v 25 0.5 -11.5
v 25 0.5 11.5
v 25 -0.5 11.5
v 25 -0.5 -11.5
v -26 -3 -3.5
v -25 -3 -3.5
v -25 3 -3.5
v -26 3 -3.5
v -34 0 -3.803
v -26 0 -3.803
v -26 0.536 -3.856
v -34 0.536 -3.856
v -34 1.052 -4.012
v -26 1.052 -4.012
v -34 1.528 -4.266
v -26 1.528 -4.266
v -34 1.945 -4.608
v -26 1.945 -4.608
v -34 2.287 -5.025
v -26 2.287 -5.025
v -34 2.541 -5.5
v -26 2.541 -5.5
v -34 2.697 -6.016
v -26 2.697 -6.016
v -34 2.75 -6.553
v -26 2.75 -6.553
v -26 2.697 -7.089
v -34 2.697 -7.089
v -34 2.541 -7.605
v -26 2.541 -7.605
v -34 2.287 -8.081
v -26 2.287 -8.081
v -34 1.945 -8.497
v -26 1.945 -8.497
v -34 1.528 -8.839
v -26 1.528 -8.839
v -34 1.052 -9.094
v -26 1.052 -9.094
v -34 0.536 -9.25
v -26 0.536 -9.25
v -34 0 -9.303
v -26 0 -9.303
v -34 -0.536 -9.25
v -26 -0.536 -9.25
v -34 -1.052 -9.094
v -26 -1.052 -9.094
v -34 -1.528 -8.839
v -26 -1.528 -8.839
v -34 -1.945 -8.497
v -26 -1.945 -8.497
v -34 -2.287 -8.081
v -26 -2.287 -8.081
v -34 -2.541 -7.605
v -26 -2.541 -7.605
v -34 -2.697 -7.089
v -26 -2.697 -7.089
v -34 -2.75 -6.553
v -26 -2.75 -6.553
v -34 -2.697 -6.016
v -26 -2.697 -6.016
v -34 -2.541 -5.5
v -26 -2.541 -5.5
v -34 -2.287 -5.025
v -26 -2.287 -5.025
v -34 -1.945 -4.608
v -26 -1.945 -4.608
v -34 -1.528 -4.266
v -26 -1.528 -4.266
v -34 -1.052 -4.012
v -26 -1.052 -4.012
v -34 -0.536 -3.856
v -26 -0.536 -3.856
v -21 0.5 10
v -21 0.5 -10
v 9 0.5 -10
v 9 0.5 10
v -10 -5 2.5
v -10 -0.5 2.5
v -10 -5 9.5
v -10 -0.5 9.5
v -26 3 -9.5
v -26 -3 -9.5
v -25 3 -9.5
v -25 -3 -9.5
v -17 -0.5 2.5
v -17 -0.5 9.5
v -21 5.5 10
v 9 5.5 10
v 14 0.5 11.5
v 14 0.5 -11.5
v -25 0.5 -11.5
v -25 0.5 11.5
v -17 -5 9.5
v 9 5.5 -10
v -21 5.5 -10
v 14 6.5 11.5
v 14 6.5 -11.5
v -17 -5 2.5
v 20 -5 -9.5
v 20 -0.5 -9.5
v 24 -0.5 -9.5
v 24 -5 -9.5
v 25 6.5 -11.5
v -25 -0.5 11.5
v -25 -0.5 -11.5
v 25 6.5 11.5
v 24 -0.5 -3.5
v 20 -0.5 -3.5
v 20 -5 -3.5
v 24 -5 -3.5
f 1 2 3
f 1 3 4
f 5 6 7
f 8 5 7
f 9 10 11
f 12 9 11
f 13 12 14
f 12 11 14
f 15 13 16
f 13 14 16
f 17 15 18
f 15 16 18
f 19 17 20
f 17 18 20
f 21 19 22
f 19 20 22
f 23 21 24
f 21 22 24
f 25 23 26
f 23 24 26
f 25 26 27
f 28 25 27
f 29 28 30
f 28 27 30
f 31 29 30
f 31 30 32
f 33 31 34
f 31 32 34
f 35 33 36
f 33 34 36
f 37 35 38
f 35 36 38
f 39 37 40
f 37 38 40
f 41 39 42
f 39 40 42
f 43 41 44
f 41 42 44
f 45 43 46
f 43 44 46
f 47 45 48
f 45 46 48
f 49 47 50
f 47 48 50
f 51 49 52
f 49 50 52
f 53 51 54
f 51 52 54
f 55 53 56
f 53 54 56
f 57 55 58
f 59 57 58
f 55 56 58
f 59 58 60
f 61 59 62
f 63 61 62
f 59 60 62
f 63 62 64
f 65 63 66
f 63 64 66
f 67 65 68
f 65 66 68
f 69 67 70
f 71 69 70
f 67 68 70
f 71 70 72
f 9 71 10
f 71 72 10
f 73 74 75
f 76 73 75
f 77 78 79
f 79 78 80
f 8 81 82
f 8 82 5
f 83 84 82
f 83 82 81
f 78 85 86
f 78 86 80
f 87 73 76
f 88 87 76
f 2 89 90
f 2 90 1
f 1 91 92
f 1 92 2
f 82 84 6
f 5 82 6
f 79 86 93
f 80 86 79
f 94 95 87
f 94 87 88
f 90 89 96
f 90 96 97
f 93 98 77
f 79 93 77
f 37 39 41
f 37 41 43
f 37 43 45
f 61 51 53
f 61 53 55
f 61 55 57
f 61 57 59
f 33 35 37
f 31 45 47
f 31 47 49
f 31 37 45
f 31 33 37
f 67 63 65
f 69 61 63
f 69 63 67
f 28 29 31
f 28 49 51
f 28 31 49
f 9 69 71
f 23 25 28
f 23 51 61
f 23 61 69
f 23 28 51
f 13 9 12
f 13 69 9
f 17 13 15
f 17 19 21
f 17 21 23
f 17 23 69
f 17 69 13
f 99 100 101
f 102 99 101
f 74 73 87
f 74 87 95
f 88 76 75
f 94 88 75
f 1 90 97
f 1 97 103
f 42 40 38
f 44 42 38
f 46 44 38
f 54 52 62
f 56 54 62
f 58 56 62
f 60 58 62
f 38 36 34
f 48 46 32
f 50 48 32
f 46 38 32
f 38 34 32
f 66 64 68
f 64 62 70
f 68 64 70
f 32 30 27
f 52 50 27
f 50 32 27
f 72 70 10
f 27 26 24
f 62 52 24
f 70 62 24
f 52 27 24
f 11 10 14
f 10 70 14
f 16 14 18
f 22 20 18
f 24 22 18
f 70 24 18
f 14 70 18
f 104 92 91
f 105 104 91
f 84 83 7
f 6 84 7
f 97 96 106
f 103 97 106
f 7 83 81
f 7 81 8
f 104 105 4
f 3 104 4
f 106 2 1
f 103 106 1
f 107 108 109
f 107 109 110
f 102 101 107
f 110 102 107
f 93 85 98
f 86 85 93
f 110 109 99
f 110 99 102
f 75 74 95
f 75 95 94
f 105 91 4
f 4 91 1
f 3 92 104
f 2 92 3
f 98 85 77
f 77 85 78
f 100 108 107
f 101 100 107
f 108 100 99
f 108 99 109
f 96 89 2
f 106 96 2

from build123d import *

# Parameters (mm, degrees)
SKETCH1_W             = 50
SKETCH1_H             = 23
BOSS_EXTRUDE1_DEPTH   = 0.5
SKETCH2_W             = 30
SKETCH2_H             = 20
BOSS_EXTRUDE2_DEPTH   = 5
SKETCH3_W             = 7
SKETCH3_H             = 7
BOSS_EXTRUDE3_DEPTH   = 4.5
SKETCH3_W_2           = 4
SKETCH3_H_2           = 6
BOSS_EXTRUDE3_2_DEPTH = 4.5
SKETCH4_W             = 6
SKETCH4_H             = 6
BOSS_EXTRUDE4_DEPTH   = 1
SKETCH5_R             = 2.75
BOSS_EXTRUDE5_DEPTH   = 8
SKETCH6_W             = 11
SKETCH6_H             = 23
BOSS_EXTRUDE6_DEPTH   = 6


with BuildPart() as part:
    # Sketch1 → Boss-Extrude1 (new, symmetric)
    with BuildSketch(Plane(origin=(0, 0, 0), x_dir=(1, 0, 0), z_dir=(0, 1, 0))):
        Rectangle(SKETCH1_W, SKETCH1_H)
    extrude(amount=BOSS_EXTRUDE1_DEPTH, both=True)


with BuildPart() as body_2:
    # Sketch2 → Boss-Extrude2 (new body)
    with BuildSketch(Plane(origin=(0, 0.5, 0), x_dir=(1, 0, 0), z_dir=(0, 1, 0))):
        with Locations((-6, 0)):
            Rectangle(SKETCH2_W, SKETCH2_H)
    extrude(amount=BOSS_EXTRUDE2_DEPTH)


with BuildPart() as body_3:
    # Sketch3 → Boss-Extrude3 (new body)
    with BuildSketch(Plane.XZ.offset(0.5)):
        with Locations((-13.5, 6)):
            Rectangle(SKETCH3_W, SKETCH3_H)
    extrude(amount=BOSS_EXTRUDE3_DEPTH)


with BuildPart() as body_4:
    # Sketch3 → Boss-Extrude3 2 (new body)
    with BuildSketch(Plane.XZ.offset(0.5)):
        with Locations((22, -6.5)):
            Rectangle(SKETCH3_W_2, SKETCH3_H_2)
    extrude(amount=BOSS_EXTRUDE3_2_DEPTH)


with BuildPart() as body_5:
    # Sketch4 → Boss-Extrude4 (new body)
    with BuildSketch(Plane.ZY.offset(25)):
        with Locations((-6.5, 0)):
            Rectangle(SKETCH4_W, SKETCH4_H)
    extrude(amount=BOSS_EXTRUDE4_DEPTH)


with BuildPart() as body_6:
    # Sketch5 → Boss-Extrude5 (new body)
    with BuildSketch(Plane.ZY.offset(26)):
        with Locations((-6.552838998, 0)):
            Circle(SKETCH5_R)
    extrude(amount=BOSS_EXTRUDE5_DEPTH)


with BuildPart() as body_7:
    # Sketch6 → Boss-Extrude6 (new body)
    with BuildSketch(Plane(origin=(0, 0.5, 0), x_dir=(1, 0, 0), z_dir=(0, 1, 0))):
        with Locations((19.5, 0)):
            Rectangle(SKETCH6_W, SKETCH6_H)
    extrude(amount=BOSS_EXTRUDE6_DEPTH)


solid = Compound([part.part, body_2.part, body_3.part, body_4.part, body_5.part, body_6.part, body_7.part])
